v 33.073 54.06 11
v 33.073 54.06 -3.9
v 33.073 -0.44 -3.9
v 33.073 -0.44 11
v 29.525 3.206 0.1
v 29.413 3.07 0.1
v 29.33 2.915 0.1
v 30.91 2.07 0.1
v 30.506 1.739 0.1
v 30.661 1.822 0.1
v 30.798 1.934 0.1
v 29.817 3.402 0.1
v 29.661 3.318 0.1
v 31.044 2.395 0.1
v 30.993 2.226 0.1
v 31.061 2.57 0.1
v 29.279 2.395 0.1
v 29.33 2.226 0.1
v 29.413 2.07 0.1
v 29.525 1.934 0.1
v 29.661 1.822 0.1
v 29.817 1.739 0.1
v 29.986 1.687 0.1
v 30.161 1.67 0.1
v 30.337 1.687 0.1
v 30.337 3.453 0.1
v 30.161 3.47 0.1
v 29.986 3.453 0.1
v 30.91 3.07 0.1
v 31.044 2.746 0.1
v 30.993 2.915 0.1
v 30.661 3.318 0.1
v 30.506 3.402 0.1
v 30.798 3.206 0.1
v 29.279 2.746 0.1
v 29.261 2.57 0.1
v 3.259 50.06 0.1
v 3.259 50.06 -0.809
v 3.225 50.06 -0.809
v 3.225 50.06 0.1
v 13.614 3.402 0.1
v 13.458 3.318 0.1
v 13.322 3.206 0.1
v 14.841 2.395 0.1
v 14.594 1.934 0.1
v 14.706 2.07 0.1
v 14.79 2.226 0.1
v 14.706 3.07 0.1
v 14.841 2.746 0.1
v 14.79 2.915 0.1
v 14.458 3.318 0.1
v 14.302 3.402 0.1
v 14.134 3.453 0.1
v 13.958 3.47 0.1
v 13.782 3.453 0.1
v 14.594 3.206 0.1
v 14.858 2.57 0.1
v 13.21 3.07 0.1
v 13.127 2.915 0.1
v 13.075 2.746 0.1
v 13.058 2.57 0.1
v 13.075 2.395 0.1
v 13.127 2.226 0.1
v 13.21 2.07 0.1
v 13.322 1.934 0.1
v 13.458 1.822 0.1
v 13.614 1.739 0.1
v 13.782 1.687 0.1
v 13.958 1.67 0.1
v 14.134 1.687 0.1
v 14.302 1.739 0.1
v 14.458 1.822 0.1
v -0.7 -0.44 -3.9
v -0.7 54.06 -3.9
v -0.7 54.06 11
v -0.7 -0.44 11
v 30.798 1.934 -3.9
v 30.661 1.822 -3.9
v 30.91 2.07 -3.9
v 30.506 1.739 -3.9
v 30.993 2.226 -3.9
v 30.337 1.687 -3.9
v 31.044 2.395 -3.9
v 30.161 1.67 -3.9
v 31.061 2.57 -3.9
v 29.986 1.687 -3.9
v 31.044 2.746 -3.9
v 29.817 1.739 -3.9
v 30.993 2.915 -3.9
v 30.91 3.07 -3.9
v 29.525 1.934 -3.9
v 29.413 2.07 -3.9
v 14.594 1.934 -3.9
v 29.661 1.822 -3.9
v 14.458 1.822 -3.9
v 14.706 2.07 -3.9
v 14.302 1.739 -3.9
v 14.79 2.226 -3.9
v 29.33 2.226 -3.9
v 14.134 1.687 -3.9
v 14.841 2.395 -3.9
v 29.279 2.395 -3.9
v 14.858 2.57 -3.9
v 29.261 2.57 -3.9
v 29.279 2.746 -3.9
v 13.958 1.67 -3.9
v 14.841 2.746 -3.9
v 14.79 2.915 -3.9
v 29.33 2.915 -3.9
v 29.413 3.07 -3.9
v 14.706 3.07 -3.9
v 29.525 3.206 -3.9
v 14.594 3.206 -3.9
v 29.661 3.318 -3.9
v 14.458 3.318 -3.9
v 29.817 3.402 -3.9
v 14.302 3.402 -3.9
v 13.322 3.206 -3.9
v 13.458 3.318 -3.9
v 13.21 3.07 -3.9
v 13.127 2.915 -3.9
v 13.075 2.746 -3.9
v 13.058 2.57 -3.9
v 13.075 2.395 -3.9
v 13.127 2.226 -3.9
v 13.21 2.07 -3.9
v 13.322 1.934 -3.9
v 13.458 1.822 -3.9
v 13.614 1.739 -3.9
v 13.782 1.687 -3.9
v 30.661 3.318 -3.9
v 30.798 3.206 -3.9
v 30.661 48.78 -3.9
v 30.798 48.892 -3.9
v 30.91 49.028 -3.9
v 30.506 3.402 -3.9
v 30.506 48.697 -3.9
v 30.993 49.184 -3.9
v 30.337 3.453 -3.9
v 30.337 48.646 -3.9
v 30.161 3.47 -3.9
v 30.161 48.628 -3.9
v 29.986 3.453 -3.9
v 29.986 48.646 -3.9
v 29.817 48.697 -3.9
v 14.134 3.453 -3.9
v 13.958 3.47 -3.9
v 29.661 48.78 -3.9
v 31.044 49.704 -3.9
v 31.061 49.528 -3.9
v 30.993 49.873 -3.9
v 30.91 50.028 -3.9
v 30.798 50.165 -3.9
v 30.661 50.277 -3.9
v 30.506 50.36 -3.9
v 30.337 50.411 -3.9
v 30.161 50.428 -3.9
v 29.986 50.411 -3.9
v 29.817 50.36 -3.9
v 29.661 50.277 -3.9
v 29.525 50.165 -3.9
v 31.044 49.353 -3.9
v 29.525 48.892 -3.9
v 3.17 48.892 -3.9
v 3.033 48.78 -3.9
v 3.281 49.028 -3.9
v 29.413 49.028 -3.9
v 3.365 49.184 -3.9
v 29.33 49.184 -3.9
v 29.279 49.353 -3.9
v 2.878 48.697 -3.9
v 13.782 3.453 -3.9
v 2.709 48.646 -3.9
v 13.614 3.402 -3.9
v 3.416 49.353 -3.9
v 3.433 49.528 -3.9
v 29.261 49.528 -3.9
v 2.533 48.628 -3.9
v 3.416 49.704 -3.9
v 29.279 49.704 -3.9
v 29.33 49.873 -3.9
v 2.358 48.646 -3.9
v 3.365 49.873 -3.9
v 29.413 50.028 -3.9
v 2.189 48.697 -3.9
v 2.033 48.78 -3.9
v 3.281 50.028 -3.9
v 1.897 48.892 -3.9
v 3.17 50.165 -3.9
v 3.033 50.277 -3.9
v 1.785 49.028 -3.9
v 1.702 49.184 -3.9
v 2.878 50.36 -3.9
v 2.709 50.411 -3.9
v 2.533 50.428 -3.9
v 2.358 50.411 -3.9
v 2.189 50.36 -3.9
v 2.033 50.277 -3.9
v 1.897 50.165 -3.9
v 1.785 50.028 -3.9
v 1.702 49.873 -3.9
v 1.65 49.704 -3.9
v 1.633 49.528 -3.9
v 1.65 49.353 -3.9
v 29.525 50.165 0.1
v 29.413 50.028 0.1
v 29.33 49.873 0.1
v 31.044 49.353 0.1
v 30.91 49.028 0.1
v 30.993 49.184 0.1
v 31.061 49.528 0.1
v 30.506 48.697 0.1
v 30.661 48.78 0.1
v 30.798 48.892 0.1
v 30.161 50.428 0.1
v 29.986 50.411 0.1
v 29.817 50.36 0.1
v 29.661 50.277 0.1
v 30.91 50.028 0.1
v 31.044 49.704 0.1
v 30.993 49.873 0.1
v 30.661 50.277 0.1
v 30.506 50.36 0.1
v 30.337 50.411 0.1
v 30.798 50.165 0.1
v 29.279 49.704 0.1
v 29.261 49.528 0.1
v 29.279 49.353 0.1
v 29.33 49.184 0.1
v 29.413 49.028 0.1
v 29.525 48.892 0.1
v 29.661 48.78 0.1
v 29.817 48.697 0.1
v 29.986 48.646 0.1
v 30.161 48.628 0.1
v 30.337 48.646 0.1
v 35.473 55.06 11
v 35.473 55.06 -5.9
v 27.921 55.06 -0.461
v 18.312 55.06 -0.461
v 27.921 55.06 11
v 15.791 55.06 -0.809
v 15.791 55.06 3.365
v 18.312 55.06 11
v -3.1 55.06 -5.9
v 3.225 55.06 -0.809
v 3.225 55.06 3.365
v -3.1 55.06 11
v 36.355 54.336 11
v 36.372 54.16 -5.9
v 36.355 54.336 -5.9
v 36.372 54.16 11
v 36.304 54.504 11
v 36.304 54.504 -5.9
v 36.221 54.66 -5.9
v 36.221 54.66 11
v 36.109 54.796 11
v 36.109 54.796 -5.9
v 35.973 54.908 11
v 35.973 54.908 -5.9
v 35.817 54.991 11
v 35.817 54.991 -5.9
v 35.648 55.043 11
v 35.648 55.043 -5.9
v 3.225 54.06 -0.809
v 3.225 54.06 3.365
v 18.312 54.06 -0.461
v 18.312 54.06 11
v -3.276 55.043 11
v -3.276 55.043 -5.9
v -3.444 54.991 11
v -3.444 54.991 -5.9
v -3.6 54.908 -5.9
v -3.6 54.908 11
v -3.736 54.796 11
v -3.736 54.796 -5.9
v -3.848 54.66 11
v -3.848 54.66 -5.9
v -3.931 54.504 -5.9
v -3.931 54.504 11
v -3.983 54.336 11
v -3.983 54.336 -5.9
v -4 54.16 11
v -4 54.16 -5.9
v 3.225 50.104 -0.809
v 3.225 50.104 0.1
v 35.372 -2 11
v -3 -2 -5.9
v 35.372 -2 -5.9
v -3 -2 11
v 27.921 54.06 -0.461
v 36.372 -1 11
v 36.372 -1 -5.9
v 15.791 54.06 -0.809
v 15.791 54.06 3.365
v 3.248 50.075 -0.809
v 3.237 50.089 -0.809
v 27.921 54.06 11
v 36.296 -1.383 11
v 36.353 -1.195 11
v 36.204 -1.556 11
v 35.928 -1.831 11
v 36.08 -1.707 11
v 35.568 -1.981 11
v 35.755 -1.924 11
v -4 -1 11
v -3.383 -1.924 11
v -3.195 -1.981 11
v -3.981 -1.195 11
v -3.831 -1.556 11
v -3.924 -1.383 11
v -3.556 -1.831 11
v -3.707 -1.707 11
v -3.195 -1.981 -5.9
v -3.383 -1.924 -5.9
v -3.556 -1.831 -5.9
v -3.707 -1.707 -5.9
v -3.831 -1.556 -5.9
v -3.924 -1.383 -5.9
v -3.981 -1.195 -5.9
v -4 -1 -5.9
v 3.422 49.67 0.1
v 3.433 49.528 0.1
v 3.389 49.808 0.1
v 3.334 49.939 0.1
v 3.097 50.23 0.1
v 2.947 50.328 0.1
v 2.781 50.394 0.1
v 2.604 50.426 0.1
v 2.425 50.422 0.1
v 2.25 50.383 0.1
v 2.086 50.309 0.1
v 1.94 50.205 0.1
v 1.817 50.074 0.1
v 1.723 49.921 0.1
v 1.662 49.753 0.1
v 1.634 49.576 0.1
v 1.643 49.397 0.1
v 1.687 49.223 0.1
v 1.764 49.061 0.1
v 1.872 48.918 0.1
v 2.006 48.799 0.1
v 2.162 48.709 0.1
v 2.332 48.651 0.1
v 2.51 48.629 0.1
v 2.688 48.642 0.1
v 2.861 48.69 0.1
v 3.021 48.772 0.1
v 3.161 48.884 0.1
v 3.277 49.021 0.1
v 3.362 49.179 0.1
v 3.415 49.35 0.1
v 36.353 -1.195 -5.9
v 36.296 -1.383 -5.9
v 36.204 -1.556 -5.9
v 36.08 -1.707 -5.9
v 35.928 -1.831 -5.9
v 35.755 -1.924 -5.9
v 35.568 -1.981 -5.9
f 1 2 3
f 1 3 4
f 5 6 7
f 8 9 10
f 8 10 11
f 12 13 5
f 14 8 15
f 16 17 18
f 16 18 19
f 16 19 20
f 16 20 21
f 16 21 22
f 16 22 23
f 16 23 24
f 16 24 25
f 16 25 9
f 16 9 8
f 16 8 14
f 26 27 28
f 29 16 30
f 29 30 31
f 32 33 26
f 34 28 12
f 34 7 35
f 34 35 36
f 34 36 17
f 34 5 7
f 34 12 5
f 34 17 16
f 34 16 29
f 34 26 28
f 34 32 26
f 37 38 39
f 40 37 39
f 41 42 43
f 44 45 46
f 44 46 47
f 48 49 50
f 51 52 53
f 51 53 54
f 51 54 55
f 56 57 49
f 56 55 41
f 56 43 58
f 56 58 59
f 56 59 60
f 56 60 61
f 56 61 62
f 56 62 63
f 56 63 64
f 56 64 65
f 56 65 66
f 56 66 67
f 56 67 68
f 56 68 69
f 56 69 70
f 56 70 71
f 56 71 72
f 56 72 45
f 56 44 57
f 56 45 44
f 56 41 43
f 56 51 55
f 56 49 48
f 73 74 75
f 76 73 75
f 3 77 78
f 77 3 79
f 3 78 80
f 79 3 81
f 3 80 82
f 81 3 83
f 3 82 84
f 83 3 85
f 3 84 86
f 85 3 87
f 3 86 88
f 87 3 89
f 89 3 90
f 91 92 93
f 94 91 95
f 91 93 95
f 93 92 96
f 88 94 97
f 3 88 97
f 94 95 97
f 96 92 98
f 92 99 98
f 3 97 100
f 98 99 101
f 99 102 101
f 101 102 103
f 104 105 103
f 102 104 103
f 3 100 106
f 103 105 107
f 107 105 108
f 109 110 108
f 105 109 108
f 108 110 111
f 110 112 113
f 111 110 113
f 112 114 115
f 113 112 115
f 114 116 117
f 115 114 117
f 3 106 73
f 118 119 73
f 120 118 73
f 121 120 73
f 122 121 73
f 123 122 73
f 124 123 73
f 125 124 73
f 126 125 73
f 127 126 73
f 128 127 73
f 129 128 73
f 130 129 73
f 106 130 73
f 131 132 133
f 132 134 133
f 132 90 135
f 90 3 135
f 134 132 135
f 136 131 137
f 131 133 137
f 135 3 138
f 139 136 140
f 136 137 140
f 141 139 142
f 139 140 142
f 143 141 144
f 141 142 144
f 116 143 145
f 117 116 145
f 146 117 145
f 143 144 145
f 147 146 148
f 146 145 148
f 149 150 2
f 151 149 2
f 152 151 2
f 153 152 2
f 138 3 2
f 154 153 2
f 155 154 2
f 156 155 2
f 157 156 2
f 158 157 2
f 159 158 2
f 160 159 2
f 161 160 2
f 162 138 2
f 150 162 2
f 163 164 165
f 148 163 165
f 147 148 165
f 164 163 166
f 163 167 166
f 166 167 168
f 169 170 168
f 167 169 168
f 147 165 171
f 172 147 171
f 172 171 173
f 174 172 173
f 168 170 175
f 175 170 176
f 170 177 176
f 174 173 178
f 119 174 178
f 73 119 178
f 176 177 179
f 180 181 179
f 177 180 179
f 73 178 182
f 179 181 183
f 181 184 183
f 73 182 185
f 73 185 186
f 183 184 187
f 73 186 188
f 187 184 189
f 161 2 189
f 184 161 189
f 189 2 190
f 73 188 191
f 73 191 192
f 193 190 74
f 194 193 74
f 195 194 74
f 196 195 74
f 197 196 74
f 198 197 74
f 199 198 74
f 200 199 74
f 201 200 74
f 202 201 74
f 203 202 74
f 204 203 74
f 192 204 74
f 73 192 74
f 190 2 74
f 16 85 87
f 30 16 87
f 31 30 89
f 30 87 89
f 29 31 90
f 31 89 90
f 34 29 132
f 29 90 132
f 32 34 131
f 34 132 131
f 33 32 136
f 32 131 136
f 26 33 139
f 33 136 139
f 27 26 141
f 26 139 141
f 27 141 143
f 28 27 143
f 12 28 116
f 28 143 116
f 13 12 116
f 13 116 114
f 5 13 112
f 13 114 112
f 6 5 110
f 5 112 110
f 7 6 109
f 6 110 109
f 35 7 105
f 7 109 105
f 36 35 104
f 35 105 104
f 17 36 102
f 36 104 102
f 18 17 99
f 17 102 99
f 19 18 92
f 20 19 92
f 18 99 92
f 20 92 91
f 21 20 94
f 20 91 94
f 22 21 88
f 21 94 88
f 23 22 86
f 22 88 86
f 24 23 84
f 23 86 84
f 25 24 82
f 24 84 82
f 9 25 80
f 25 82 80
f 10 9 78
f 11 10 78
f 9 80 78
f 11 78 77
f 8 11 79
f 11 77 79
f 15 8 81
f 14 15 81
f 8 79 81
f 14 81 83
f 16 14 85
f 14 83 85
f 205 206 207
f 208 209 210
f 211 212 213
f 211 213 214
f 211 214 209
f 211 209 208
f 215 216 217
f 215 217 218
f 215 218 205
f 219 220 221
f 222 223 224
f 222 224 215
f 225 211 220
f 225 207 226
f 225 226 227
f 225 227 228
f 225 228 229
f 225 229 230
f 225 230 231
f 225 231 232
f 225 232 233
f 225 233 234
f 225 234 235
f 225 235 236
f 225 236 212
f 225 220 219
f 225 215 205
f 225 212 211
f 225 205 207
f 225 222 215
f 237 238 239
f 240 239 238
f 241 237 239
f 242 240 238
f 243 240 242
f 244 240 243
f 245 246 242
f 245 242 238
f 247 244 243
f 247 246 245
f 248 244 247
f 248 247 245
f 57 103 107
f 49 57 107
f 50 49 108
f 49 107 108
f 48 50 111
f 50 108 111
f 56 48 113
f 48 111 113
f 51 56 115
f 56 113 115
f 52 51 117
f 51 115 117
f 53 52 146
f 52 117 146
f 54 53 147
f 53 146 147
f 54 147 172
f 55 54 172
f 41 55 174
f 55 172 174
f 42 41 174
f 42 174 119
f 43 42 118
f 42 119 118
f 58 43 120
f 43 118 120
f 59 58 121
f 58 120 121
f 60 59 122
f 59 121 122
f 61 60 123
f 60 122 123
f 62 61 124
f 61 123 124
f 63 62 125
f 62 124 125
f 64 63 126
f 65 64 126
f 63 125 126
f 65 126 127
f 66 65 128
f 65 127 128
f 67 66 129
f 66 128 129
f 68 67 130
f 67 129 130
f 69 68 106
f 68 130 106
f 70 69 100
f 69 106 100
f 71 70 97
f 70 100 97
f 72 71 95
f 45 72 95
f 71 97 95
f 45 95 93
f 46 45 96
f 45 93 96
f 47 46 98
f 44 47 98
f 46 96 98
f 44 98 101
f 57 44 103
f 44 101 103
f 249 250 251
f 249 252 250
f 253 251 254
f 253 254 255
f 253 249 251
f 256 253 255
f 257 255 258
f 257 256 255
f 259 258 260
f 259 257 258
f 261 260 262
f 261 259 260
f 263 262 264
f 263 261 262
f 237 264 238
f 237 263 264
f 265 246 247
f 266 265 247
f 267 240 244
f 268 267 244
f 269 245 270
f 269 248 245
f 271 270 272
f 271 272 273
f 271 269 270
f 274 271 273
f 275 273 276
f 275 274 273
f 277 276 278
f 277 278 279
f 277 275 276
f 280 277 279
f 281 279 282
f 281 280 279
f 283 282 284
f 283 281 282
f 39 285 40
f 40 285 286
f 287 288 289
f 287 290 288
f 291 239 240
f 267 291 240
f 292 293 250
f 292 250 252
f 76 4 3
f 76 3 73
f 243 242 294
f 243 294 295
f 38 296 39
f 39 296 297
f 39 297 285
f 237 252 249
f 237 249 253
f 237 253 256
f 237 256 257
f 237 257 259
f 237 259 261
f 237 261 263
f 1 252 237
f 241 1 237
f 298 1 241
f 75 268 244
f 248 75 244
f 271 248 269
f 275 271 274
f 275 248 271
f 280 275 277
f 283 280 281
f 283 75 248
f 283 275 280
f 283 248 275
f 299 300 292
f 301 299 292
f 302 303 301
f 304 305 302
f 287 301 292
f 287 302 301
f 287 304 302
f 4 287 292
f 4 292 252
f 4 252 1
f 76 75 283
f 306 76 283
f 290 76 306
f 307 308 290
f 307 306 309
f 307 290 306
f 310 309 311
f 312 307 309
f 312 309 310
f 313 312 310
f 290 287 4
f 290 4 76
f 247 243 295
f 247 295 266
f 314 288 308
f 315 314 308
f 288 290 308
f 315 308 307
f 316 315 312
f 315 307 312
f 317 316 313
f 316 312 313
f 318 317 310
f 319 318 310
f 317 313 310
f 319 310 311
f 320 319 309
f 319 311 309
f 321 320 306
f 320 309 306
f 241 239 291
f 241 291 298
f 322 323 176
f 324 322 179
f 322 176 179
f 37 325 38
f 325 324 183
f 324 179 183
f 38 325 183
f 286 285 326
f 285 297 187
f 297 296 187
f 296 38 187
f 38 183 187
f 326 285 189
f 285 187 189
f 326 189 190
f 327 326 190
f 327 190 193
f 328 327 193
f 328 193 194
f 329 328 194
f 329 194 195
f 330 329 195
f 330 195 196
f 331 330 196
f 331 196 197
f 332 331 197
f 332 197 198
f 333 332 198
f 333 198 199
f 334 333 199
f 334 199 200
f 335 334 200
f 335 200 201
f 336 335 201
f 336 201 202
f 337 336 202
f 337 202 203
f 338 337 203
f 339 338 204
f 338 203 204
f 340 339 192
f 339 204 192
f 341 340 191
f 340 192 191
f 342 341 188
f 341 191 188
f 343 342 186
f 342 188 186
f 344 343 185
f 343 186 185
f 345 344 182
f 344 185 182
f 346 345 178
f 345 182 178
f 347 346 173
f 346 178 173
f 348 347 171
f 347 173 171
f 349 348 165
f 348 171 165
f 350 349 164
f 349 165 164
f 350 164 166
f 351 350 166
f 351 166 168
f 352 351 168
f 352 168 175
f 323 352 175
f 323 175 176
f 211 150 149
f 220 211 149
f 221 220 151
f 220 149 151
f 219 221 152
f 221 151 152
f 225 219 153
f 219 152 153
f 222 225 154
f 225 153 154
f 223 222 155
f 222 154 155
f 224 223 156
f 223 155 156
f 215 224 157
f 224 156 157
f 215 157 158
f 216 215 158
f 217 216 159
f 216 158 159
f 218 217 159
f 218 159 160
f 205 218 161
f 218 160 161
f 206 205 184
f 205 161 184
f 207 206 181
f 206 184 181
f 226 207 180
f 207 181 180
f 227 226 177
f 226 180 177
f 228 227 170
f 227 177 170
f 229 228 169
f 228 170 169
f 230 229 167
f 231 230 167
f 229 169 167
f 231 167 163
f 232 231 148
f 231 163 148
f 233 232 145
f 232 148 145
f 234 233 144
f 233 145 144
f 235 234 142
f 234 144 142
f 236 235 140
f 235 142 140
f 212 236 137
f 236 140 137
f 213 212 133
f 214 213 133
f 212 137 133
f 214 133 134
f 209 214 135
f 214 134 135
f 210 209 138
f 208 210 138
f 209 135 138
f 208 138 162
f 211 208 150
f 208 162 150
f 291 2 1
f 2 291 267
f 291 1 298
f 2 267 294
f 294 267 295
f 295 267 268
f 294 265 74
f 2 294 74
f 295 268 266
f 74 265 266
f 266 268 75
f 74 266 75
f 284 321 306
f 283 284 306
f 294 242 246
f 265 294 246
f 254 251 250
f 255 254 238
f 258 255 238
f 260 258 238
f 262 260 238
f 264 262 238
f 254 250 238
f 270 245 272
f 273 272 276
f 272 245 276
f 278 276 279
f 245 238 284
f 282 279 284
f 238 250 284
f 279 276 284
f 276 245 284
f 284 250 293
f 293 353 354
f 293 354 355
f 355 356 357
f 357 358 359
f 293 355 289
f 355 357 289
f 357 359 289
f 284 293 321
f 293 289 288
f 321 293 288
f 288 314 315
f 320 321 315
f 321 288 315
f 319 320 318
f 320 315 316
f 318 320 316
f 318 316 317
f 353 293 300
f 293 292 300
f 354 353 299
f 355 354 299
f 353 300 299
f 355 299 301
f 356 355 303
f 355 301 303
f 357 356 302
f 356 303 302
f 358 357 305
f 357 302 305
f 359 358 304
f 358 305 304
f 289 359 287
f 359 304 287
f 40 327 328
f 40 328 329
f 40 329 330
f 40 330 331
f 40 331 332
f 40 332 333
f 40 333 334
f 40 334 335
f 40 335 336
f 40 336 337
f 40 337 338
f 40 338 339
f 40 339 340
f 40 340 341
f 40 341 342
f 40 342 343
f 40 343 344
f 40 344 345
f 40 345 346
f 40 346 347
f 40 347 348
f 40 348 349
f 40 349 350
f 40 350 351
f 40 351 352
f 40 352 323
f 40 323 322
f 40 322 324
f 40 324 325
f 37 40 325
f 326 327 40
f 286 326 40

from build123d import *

# Parameters (mm, degrees)
SKETCH_W          = 32.3725
SKETCH_H          = 52.06
SKETCH_R          = 0.6
SKETCH_R_2        = 0.51
SKETCH_R_3        = 1.27
SKETCH_R_4        = 0.45
SKETCH_R_5        = 0.4
SKETCH_R_6        = 0.85
SKETCH_R_7        = 1
SKETCH_R_8        = 0.65
SKETCH_R_9        = 0.405
SKETCH_R_10       = 0.55
SKETCH_R_11       = 0.5
PAD_DEPTH         = 0.1
SKETCH002_W       = 40.3725
SKETCH002_H       = 56.06
PAD001_DEPTH      = 10.9
PAD001_DEPTH_BACK = 6
SKETCH003_W       = 33.7725
SKETCH003_H       = 14.9
POCKET_DEPTH      = 54.5
SKETCH004_R       = 0.9
PAD002_DEPTH      = 4
SKETCH005_W       = 40.3725
SKETCH005_H       = 16.9
PAD003_DEPTH      = 1
SKETCH006_W       = 12.565357
SKETCH006_H       = 4.17396
SKETCH006_W_2     = 9.608805
SKETCH006_H_2     = 11.565347
POCKET001_DEPTH   = 5
FILLET_R          = 1
FILLET001_R       = 1
FILLET002_R       = 0.9
FILLET003_R       = 0.9


with BuildPart() as part:
    # Sketch → Pad (new body)
    with BuildSketch(Plane.XY):
        with Locations((16.18625, 26.03)):
            Rectangle(SKETCH_W, SKETCH_H)
        with Locations((8.1, 2.23)):
            Circle(SKETCH_R, mode=Mode.SUBTRACT)
        with Locations((8.26, 43.82)):
            Circle(SKETCH_R_2, mode=Mode.SUBTRACT)
        with Locations((13.97, 2.54)):
            Circle(SKETCH_R_3, mode=Mode.SUBTRACT)
        with Locations((17.78, 35.56)):
            Circle(SKETCH_R_4, mode=Mode.SUBTRACT)
        with Locations((16.19, 22.23)):
            Circle(SKETCH_R_5, mode=Mode.SUBTRACT)
        with Locations((16.19, 24.77)):
            Circle(SKETCH_R_5, mode=Mode.SUBTRACT)
        with Locations((13.65, 22.23)):
            Circle(SKETCH_R_5, mode=Mode.SUBTRACT)
        with Locations((13.65, 24.77)):
            Circle(SKETCH_R_5, mode=Mode.SUBTRACT)
        with Locations((15.24, 35.56)):
            Circle(SKETCH_R_4, mode=Mode.SUBTRACT)
        with Locations((10.55, 31.43)):
            Circle(SKETCH_R_6, mode=Mode.SUBTRACT)
        with Locations((10.55, 6.03)):
            Circle(SKETCH_R_6, mode=Mode.SUBTRACT)
        with Locations((17.36, 11.6275)):
            Circle(SKETCH_R_7, mode=Mode.SUBTRACT)
        with Locations((13.65, 19.69)):
            Circle(SKETCH_R_5, mode=Mode.SUBTRACT)
        with Locations((16.19, 19.69)):
            Circle(SKETCH_R_5, mode=Mode.SUBTRACT)
        with Locations((13.34, 43.82)):
            Circle(SKETCH_R_2, mode=Mode.SUBTRACT)
        with Locations((10.79, 43.82)):
            Circle(SKETCH_R_2, mode=Mode.SUBTRACT)
        with Locations((18.41, 41.91)):
            Circle(SKETCH_R_8, mode=Mode.SUBTRACT)
        with Locations((30.1625, 2.54)):
            Circle(SKETCH_R_3, mode=Mode.SUBTRACT)
        with Locations((28.36, 11.6275)):
            Circle(SKETCH_R_7, mode=Mode.SUBTRACT)
        with Locations((29.21, 29.53)):
            Circle(SKETCH_R_9, mode=Mode.SUBTRACT)
        with Locations((29.21, 24.45)):
            Circle(SKETCH_R_9, mode=Mode.SUBTRACT)
        with Locations((29.21, 16.83)):
            Circle(SKETCH_R_9, mode=Mode.SUBTRACT)
        with Locations((25.36, 23.54)):
            Circle(SKETCH_R_10, mode=Mode.SUBTRACT)
        with Locations((25.36, 1.63)):
            Circle(SKETCH_R_11, mode=Mode.SUBTRACT)
        with Locations((25.36, 4.13)):
            Circle(SKETCH_R_11, mode=Mode.SUBTRACT)
        with Locations((25.36, 28.54)):
            Circle(SKETCH_R_10, mode=Mode.SUBTRACT)
        with Locations((22.86, 1.63)):
            Circle(SKETCH_R_11, mode=Mode.SUBTRACT)
        with Locations((22.86, 4.13)):
            Circle(SKETCH_R_11, mode=Mode.SUBTRACT)
        with Locations((20.36, 1.63)):
            Circle(SKETCH_R_11, mode=Mode.SUBTRACT)
        with Locations((20.36, 4.13)):
            Circle(SKETCH_R_11, mode=Mode.SUBTRACT)
        with Locations((20.32, 35.56)):
            Circle(SKETCH_R_4, mode=Mode.SUBTRACT)
        with Locations((20.36, 23.54)):
            Circle(SKETCH_R_10, mode=Mode.SUBTRACT)
        with Locations((20.36, 28.54)):
            Circle(SKETCH_R_10, mode=Mode.SUBTRACT)
        with Locations((23.12, 44.91)):
            Circle(SKETCH_R_8, mode=Mode.SUBTRACT)
        with Locations((23.12, 38.91)):
            Circle(SKETCH_R_8, mode=Mode.SUBTRACT)
        with Locations((29.21, 37.15)):
            Circle(SKETCH_R_9, mode=Mode.SUBTRACT)
        with Locations((30.1625, 49.53)):
            Circle(SKETCH_R_3, mode=Mode.SUBTRACT)
        with Locations((4.6, 35.23)):
            Circle(SKETCH_R, mode=Mode.SUBTRACT)
        with Locations((4.6, 2.23)):
            Circle(SKETCH_R, mode=Mode.SUBTRACT)
        with Locations((5.71, 43.82)):
            Circle(SKETCH_R_2, mode=Mode.SUBTRACT)
        with Locations((2.15, 7.33)):
            Circle(SKETCH_R_6, mode=Mode.SUBTRACT)
        with Locations((2.54, 49.53)):
            Circle(SKETCH_R_3, mode=Mode.SUBTRACT)
        with Locations((2.15, 30.13)):
            Circle(SKETCH_R_6, mode=Mode.SUBTRACT)
    extrude(amount=PAD_DEPTH)

    # Sketch002 → Pad001 (new body, two sides)
    with BuildSketch(Plane.XY.offset(0.1)) as pad001_sk:
        with Locations((16.18625, 26.03)):
            Rectangle(SKETCH002_W, SKETCH002_H)
    extrude(amount=PAD001_DEPTH)
    extrude(pad001_sk.sketch, amount=-PAD001_DEPTH_BACK)

    # Sketch003 → Pocket (cut)
    with BuildSketch(Plane(origin=(0, 54.06, 0), x_dir=(-1, 0, 0), z_dir=(0, 1, 0))):
        with Locations((-16.18625, 3.55)):
            Rectangle(SKETCH003_W, SKETCH003_H)
    extrude(amount=-POCKET_DEPTH, mode=Mode.SUBTRACT)

    # Sketch004 → Pad002 (new body)
    with BuildSketch(Plane.XY.offset(-3.9)):
        with Locations((2.533148, 49.528465)):
            Circle(SKETCH004_R)
        with Locations((30.161428, 49.528465)):
            Circle(SKETCH004_R)
        with Locations((30.161428, 2.570097)):
            Circle(SKETCH004_R)
        with Locations((13.958012, 2.570097)):
            Circle(SKETCH004_R)
    extrude(amount=PAD002_DEPTH)

    # Sketch005 → Pad003 (new body)
    with BuildSketch(Plane(origin=(0, 54.06, 0), x_dir=(-1, 0, 0), z_dir=(0, 1, 0))):
        with Locations((-16.18625, 2.55)):
            Rectangle(SKETCH005_W, SKETCH005_H)
    extrude(amount=PAD003_DEPTH)

    # Sketch006 → Pocket001 (cut)
    with BuildSketch(Plane(origin=(0, 55.06, 0), x_dir=(-1, 0, 0), z_dir=(0, 1, 0))):
        with Locations((-9.507967, 1.278049)):
            Rectangle(SKETCH006_W, SKETCH006_H)
        with Locations((-23.116813, 5.321573)):
            Rectangle(SKETCH006_W_2, SKETCH006_H_2)
    extrude(amount=-POCKET001_DEPTH, mode=Mode.SUBTRACT)

    # Fillet
    fillet_edges = [part.edges().sort_by_distance(p)[0] for p in [
        (36.3725, -2, 2.55),
    ]]
    fillet(fillet_edges, radius=FILLET_R)

    # Fillet001
    fillet001_edges = [part.edges().sort_by_distance(p)[0] for p in [
        (-4, -2, 2.55),
    ]]
    fillet(fillet001_edges, radius=FILLET001_R)

    # Fillet002
    fillet002_edges = [part.edges().sort_by_distance(p)[0] for p in [
        (36.3725, 55.06, 2.55),
    ]]
    fillet(fillet002_edges, radius=FILLET002_R)

    # Fillet003
    fillet003_edges = [part.edges().sort_by_distance(p)[0] for p in [
        (-4, 55.06, 2.55),
    ]]
    fillet(fillet003_edges, radius=FILLET003_R)


solid = part.part
